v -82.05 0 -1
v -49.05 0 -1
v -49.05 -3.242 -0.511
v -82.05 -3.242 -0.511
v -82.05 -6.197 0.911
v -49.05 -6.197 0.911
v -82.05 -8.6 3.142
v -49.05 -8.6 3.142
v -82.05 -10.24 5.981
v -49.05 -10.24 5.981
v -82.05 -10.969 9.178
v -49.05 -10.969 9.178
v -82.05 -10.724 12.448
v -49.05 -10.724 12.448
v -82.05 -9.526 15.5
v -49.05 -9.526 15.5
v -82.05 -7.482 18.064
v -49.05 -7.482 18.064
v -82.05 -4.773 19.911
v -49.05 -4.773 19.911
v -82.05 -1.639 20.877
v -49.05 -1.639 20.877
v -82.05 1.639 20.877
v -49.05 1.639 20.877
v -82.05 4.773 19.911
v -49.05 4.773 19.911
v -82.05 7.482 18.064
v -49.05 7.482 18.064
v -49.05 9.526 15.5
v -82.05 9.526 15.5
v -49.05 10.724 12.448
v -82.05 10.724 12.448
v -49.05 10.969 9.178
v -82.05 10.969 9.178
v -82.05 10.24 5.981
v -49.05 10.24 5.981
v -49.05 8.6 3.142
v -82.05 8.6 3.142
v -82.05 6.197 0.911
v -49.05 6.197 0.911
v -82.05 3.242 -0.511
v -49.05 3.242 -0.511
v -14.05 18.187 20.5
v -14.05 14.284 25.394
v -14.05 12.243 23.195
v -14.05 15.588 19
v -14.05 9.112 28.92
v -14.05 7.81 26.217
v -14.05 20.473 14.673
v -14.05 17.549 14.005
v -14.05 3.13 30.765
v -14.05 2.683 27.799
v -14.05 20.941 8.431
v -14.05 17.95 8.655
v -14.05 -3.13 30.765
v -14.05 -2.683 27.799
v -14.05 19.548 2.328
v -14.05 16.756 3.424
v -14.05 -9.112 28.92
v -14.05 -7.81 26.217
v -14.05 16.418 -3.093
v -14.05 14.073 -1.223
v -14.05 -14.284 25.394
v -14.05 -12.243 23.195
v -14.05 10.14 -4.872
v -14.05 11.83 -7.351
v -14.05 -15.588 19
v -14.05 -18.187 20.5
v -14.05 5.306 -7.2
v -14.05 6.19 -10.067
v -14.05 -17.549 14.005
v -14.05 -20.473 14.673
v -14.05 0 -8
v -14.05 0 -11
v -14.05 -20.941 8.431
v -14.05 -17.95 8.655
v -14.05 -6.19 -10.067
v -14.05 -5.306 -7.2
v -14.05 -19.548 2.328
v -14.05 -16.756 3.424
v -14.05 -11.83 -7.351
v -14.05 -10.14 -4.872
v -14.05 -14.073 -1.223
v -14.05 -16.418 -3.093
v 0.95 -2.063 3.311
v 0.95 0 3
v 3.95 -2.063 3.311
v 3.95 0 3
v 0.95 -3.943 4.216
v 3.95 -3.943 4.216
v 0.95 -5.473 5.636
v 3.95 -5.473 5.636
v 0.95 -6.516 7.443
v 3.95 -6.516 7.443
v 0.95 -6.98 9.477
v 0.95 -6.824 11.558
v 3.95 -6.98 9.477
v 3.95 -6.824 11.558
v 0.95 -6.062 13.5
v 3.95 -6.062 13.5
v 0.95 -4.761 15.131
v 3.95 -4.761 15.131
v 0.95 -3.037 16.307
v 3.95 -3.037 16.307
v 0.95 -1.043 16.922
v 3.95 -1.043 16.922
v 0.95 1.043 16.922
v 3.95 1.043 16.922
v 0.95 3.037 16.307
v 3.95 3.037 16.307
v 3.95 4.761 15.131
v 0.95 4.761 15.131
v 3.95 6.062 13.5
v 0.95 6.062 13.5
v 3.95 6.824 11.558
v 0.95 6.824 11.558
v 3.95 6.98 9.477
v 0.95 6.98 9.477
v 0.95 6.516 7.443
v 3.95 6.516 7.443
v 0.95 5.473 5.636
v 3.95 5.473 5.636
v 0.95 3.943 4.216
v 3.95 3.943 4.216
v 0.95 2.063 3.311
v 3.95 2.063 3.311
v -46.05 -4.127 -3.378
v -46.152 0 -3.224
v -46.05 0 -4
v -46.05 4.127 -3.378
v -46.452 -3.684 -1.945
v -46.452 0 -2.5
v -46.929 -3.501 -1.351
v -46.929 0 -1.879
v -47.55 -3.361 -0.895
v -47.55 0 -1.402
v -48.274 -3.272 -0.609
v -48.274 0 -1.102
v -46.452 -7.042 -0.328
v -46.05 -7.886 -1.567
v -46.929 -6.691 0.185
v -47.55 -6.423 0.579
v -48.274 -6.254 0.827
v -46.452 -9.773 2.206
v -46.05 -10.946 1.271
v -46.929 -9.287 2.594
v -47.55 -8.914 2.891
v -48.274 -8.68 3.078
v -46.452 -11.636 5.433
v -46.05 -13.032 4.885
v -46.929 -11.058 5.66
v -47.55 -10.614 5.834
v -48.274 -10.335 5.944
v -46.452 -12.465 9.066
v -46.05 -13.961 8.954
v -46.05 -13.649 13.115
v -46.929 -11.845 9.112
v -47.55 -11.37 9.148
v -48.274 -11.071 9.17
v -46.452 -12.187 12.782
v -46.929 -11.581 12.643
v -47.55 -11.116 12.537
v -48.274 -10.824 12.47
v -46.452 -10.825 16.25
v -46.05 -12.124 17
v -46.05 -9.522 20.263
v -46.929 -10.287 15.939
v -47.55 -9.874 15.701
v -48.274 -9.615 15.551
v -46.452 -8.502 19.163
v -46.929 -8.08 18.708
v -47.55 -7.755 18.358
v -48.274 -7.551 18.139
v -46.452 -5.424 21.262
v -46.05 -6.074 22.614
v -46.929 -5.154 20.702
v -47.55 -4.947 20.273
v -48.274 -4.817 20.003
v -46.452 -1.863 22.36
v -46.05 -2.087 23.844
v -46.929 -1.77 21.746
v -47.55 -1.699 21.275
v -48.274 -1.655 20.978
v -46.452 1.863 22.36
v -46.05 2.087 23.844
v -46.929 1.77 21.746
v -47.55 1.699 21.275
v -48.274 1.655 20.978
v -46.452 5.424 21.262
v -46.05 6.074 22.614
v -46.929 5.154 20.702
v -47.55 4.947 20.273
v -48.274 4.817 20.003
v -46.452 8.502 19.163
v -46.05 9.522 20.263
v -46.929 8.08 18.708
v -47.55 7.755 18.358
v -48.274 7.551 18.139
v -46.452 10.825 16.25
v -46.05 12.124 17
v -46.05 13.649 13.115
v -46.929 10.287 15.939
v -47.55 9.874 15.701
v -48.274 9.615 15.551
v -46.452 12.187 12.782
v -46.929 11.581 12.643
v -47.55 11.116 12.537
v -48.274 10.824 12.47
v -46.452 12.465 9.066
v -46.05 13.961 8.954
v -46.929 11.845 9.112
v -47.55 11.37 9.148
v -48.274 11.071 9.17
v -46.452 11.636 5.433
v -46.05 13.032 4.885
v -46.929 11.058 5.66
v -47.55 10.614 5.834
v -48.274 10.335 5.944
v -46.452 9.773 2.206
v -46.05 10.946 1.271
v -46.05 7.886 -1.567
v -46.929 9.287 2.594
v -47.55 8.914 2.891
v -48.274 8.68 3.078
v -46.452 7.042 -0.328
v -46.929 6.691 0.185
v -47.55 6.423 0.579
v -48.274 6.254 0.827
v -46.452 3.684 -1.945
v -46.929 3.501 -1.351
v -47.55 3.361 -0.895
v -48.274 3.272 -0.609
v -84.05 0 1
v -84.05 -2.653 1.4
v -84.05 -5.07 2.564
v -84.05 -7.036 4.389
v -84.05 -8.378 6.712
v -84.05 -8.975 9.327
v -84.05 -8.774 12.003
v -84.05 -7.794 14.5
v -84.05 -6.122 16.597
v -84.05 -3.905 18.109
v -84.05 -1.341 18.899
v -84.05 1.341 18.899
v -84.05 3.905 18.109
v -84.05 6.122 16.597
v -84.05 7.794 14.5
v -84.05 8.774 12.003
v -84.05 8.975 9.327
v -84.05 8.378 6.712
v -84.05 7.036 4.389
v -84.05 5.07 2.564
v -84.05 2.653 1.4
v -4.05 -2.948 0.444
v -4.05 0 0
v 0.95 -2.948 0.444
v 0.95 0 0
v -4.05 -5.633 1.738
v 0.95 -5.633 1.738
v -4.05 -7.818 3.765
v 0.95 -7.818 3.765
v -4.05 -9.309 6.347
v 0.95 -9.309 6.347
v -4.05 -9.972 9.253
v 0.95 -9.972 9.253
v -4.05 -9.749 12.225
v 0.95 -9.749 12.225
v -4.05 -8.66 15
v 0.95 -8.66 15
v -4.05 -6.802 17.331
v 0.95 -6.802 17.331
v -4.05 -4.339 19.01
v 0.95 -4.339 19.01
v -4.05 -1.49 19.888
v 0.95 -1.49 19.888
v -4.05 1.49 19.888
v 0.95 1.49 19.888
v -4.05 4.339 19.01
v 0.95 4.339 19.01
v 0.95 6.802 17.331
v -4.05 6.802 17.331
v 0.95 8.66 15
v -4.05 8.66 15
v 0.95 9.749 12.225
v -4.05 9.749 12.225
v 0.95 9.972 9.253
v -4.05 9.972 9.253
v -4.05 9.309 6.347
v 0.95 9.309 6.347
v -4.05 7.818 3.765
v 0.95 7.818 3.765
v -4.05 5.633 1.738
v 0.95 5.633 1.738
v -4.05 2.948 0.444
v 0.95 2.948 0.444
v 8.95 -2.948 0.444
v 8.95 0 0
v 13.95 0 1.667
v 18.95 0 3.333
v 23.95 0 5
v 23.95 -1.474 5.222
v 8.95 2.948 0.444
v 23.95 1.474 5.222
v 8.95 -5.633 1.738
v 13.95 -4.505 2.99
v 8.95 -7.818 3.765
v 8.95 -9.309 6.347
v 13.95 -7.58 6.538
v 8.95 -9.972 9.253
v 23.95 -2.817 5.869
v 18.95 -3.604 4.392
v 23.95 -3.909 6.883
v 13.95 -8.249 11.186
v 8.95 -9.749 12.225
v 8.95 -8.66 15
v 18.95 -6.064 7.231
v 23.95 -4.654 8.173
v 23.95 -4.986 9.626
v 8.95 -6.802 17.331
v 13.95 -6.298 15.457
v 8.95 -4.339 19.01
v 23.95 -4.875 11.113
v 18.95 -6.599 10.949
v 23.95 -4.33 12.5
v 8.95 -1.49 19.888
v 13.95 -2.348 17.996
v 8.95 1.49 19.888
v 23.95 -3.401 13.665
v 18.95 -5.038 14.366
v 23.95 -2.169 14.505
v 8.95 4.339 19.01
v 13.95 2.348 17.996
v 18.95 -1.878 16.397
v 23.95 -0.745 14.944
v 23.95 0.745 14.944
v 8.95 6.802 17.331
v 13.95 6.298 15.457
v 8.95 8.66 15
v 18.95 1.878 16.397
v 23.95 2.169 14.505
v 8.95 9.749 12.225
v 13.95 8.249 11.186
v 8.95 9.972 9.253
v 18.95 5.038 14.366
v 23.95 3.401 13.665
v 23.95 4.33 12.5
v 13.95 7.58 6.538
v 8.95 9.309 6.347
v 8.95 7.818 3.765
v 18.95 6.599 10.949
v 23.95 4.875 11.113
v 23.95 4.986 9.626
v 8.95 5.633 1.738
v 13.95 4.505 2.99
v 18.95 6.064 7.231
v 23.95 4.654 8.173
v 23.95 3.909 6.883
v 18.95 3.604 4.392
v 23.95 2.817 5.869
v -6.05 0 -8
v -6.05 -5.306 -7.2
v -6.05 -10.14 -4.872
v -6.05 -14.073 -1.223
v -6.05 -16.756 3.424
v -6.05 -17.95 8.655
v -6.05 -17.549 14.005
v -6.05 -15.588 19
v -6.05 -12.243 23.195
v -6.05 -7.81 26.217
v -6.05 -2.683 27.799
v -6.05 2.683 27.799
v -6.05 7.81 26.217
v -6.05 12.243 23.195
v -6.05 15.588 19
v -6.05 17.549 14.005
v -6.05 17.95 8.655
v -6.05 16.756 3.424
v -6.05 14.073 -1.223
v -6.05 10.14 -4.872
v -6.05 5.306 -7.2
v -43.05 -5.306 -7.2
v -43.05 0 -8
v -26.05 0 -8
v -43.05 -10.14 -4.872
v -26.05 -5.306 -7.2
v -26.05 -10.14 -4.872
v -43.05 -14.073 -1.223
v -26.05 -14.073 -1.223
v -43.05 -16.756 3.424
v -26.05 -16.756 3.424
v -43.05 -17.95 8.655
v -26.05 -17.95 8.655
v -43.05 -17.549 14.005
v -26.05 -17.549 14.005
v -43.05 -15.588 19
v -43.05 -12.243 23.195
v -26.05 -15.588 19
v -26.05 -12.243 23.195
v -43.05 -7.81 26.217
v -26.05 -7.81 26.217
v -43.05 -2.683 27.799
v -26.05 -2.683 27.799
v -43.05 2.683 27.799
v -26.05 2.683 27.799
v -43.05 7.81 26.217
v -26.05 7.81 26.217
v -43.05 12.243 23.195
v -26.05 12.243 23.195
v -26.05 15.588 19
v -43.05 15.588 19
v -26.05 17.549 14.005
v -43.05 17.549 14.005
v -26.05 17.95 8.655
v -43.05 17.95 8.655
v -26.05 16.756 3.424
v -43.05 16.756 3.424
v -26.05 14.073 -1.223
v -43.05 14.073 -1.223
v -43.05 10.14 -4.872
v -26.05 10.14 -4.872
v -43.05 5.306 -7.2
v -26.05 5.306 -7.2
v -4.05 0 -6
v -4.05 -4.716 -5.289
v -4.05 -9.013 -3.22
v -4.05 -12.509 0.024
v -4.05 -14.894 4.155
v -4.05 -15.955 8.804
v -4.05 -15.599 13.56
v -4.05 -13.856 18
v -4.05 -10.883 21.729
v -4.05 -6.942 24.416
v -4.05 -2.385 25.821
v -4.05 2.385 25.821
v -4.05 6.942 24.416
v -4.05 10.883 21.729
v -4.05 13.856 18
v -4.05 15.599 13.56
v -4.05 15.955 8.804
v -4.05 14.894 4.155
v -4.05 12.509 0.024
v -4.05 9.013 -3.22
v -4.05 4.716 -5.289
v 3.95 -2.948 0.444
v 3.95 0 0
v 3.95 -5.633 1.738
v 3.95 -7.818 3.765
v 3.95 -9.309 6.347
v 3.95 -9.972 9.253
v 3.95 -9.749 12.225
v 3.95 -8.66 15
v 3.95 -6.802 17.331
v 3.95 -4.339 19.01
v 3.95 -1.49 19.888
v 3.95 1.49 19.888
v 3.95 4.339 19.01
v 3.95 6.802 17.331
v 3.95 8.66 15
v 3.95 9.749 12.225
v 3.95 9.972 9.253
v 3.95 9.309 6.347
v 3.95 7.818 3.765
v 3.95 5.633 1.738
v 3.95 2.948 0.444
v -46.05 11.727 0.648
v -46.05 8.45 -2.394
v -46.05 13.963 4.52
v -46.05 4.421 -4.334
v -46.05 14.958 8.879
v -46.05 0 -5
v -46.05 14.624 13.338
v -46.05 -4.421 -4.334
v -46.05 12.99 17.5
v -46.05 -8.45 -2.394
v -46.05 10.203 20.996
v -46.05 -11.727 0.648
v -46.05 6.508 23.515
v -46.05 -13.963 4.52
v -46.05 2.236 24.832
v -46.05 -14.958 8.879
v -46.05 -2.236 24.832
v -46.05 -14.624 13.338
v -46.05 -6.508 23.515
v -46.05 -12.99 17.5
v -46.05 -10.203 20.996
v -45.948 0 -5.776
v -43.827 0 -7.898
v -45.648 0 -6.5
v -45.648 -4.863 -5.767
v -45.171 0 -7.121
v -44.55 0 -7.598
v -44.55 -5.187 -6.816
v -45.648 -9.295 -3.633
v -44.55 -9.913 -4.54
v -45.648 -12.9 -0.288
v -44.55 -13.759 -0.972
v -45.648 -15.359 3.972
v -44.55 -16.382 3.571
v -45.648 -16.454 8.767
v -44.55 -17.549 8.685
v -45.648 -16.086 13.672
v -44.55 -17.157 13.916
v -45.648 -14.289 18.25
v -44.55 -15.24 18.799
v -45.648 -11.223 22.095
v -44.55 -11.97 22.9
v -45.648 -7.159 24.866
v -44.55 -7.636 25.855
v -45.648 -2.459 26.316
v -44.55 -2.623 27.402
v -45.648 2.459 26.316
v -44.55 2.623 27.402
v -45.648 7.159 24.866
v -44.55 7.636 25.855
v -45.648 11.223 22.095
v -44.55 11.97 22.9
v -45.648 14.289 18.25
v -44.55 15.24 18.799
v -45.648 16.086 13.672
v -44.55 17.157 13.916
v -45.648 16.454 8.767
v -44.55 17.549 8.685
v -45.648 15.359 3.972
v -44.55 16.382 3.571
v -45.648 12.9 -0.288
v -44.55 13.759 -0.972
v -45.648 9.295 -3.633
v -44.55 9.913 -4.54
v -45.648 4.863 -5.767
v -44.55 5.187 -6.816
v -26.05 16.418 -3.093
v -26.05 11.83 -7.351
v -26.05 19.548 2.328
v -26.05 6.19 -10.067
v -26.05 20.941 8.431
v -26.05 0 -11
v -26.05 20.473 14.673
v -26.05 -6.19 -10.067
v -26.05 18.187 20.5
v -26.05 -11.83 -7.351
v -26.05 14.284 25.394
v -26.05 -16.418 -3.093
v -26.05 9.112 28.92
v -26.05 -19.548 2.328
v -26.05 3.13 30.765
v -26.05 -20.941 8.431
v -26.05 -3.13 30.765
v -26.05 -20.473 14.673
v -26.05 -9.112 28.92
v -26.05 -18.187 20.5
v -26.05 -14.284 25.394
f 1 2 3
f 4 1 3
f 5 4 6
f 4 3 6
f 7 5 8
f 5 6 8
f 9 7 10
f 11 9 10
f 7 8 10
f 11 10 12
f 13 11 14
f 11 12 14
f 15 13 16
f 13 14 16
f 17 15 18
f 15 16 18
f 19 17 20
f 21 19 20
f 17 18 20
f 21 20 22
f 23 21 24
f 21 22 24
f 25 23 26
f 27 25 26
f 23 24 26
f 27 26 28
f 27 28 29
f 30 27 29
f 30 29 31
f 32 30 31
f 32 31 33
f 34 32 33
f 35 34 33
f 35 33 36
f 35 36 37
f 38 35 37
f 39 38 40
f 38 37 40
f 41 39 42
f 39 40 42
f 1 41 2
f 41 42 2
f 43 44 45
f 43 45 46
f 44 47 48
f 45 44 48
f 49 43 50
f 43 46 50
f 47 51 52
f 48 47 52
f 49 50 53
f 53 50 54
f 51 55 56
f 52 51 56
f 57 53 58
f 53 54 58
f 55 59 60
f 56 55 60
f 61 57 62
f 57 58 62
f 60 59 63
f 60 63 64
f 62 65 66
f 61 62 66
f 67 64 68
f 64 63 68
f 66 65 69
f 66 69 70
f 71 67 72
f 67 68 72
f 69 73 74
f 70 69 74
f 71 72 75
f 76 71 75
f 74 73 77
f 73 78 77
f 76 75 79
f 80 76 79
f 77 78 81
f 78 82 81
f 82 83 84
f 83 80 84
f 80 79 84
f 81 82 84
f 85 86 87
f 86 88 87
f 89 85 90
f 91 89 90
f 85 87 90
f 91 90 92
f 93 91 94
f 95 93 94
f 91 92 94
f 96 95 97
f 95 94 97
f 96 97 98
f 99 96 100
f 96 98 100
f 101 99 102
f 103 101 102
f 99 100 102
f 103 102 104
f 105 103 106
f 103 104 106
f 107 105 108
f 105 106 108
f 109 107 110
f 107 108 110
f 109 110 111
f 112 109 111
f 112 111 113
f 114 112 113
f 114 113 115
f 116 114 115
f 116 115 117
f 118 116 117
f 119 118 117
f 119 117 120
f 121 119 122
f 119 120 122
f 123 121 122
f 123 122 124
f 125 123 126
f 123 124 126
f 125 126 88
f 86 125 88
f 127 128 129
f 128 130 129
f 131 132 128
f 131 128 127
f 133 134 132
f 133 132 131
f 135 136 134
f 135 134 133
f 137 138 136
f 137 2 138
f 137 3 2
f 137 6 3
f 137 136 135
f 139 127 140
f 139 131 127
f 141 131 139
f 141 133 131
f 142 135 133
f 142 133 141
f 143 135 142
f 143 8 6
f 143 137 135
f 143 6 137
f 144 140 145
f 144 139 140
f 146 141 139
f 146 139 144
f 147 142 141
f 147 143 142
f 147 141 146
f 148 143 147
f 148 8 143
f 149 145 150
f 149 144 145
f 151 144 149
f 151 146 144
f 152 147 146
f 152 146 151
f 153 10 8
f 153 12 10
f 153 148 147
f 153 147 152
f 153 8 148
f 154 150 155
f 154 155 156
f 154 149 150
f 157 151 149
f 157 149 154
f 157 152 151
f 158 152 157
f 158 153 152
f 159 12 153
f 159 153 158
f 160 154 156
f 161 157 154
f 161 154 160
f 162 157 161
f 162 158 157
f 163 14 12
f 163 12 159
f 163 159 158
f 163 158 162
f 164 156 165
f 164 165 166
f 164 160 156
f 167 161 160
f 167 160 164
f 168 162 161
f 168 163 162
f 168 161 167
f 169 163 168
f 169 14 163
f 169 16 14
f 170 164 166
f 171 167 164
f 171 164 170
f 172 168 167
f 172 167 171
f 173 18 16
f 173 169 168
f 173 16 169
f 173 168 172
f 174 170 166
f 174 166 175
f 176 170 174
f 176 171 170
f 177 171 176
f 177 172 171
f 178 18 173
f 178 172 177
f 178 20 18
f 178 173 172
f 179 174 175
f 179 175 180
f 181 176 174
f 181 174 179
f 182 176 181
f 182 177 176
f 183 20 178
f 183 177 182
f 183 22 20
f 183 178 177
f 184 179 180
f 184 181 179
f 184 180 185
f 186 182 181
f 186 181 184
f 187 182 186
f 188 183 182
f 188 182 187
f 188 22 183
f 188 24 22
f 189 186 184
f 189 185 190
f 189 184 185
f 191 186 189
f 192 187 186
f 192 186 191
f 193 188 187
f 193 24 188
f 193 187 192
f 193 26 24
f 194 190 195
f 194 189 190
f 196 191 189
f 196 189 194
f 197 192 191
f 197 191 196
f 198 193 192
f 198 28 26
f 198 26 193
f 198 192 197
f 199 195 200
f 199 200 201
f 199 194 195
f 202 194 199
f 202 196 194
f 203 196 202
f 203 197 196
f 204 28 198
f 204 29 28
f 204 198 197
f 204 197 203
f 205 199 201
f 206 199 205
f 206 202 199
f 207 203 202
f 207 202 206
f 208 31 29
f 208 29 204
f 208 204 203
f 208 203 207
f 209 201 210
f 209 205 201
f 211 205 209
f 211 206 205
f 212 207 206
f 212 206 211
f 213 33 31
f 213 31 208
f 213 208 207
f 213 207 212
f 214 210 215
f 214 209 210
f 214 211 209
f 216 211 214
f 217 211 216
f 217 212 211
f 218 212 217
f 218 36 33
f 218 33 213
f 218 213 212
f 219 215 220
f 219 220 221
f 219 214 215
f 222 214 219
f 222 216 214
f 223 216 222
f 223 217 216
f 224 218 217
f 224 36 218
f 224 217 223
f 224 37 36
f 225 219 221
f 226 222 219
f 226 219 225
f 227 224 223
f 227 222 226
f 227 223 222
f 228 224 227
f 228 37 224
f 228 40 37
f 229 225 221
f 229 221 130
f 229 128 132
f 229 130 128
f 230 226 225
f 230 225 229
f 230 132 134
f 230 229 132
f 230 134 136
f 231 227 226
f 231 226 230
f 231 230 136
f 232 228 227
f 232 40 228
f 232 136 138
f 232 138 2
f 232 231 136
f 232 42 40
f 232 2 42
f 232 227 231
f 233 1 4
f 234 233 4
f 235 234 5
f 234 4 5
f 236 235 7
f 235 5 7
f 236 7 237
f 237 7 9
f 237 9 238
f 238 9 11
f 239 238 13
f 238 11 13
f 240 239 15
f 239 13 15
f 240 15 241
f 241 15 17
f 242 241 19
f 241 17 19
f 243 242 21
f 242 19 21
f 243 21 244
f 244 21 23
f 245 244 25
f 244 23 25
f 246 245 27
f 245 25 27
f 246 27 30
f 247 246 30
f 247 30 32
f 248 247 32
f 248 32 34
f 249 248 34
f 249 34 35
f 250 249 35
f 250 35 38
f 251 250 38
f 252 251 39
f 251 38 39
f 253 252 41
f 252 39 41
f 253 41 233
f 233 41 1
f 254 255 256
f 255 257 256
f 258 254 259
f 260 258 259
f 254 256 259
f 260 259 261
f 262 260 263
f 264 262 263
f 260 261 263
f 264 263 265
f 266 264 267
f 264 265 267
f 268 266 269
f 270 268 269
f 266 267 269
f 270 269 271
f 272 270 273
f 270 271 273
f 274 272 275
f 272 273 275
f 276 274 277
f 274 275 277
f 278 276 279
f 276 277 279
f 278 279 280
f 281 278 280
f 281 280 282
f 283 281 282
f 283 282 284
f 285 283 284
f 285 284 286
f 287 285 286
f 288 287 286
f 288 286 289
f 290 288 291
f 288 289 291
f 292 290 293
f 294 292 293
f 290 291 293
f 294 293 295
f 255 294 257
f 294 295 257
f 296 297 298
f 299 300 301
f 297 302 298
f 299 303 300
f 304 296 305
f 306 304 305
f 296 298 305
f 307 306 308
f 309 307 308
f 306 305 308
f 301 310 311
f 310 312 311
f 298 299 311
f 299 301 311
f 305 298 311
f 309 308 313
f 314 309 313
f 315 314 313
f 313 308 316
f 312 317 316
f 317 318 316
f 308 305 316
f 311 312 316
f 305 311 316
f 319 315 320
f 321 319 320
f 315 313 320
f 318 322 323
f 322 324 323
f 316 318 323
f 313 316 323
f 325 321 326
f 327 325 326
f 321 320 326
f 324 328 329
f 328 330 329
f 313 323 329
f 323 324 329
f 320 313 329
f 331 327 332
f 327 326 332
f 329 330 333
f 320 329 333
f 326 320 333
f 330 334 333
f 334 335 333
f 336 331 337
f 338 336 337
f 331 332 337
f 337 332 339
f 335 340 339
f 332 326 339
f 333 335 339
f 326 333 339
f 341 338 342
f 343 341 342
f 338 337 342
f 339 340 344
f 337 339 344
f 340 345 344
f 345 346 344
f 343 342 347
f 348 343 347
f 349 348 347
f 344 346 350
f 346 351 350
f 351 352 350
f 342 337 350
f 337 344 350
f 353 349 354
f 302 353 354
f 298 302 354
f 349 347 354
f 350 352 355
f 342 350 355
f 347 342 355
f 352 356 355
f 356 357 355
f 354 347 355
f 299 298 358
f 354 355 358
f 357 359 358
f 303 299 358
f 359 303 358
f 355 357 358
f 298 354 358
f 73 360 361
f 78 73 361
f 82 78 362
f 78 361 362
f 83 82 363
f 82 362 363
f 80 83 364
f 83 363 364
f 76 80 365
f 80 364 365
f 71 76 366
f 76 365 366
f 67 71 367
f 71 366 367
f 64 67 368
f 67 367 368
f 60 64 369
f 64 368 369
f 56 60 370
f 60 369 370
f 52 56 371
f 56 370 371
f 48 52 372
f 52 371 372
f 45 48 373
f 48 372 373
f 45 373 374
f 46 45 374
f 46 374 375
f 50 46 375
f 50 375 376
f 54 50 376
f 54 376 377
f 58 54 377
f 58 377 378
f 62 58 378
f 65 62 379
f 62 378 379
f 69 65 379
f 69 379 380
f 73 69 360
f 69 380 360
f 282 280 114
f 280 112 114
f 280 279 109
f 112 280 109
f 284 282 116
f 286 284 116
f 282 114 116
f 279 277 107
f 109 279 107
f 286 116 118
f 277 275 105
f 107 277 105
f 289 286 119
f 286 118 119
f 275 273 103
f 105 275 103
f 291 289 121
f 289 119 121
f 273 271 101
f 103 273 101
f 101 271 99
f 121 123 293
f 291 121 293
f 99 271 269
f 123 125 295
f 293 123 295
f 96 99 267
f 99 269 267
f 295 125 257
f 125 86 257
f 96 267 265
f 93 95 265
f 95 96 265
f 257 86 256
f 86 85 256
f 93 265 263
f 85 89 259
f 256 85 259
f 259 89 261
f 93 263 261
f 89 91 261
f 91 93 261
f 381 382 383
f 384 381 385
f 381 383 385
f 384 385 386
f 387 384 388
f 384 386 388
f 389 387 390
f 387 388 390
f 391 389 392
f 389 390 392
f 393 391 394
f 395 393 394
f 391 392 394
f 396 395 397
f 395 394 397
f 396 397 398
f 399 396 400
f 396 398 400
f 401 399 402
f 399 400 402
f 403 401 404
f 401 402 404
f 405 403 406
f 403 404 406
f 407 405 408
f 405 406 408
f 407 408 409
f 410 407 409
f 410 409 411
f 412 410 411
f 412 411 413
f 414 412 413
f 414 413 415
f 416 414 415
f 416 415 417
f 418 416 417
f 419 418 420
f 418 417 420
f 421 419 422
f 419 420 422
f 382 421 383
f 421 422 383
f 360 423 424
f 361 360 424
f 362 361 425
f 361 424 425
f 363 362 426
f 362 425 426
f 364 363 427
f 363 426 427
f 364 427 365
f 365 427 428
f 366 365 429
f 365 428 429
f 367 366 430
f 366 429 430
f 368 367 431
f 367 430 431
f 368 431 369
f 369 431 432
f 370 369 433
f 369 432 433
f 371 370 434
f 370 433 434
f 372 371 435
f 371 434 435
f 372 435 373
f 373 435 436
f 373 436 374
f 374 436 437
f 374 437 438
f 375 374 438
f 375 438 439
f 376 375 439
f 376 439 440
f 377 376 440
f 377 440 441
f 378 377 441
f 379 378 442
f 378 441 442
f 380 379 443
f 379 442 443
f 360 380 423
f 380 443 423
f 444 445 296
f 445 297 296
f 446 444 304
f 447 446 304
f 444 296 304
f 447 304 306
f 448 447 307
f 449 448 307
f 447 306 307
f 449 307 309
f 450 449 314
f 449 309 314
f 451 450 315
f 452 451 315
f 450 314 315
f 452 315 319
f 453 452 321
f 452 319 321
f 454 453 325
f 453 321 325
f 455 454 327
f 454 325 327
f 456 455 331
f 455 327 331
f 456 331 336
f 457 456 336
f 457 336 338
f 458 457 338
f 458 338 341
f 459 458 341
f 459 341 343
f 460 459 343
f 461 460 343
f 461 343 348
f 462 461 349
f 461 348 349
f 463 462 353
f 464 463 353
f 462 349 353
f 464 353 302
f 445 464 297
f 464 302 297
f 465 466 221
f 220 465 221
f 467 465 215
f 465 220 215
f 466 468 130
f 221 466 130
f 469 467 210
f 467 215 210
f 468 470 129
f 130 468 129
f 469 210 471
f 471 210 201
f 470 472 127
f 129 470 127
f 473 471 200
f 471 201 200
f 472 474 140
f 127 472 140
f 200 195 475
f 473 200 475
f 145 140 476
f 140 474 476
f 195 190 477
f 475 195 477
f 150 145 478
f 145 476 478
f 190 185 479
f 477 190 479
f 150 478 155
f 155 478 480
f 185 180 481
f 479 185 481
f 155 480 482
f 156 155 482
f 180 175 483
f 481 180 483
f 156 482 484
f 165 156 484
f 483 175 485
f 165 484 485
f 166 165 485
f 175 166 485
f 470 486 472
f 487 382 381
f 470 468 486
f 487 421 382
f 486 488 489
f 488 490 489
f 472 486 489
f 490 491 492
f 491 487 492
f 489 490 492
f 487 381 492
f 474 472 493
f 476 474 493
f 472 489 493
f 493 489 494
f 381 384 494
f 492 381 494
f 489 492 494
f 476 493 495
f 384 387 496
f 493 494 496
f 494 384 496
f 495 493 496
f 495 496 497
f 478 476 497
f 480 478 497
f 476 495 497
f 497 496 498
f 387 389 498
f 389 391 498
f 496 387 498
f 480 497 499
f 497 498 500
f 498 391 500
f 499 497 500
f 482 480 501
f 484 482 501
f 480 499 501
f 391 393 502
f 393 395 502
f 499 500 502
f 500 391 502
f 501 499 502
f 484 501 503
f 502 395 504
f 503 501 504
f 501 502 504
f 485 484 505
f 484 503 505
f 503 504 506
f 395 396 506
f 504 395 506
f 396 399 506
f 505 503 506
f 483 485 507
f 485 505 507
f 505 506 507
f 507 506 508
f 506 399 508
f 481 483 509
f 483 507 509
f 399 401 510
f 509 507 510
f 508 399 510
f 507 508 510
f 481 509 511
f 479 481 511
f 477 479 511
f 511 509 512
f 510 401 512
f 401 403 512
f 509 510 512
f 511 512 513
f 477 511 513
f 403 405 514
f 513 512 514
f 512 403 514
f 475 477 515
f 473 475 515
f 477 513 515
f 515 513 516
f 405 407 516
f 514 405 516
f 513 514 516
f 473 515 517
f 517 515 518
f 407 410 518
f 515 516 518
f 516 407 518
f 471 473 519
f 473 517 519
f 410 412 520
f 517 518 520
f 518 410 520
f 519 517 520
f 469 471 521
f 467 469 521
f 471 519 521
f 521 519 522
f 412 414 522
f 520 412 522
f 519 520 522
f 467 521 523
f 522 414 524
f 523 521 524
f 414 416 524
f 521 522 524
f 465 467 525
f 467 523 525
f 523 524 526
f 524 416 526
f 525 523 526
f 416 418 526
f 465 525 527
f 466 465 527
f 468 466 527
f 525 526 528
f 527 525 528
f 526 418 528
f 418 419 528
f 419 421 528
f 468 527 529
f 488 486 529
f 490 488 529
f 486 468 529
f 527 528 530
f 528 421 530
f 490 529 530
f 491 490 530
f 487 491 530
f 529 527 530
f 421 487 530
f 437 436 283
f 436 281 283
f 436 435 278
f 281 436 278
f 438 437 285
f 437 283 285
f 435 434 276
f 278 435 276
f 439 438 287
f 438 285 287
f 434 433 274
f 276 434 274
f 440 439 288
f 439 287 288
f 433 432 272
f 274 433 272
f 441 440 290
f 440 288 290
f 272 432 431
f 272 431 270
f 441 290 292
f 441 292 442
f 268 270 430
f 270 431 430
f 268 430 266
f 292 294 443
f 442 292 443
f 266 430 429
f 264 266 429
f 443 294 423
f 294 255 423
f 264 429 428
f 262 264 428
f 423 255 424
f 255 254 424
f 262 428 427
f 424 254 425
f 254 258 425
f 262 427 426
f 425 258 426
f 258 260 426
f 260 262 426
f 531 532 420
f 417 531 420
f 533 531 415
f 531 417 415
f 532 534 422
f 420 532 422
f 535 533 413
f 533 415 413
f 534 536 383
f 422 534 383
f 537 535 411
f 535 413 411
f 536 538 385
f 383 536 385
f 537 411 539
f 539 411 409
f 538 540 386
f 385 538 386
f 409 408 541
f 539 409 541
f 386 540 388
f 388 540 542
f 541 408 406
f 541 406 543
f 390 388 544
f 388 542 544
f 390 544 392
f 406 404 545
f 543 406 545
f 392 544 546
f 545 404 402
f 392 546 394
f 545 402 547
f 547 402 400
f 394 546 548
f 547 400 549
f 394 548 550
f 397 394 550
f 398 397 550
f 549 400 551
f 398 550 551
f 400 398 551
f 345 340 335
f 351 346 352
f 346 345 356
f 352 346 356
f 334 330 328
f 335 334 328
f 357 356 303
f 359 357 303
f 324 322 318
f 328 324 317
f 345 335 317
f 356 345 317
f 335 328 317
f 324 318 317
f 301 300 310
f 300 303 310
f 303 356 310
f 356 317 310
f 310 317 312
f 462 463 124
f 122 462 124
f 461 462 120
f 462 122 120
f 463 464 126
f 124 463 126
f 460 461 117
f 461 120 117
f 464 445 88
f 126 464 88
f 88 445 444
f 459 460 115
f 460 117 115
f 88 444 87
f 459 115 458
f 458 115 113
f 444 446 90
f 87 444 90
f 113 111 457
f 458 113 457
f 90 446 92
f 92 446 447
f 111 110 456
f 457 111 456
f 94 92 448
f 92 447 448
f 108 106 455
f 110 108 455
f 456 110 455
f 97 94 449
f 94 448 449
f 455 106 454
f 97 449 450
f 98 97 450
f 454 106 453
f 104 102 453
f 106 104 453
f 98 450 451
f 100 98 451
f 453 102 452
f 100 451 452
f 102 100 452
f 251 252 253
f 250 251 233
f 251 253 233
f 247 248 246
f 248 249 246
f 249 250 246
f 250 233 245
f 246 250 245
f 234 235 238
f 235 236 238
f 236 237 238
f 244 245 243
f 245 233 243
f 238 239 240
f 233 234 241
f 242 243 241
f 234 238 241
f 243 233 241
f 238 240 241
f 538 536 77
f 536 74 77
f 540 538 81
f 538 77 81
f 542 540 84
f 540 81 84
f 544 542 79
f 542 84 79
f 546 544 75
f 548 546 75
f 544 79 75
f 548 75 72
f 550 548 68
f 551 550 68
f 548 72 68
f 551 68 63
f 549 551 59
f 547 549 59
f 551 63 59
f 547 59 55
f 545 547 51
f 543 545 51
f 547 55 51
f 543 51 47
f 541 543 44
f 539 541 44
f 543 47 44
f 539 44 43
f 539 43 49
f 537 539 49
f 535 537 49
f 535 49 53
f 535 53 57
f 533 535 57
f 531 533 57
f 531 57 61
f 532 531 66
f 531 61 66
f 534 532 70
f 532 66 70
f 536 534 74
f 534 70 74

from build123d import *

# Parameters (mm, degrees)
F2_SIZE = 2
F3_R    = 3
F4_R    = 3


with BuildPart() as f1:
    # F0 (on Front) → F1 (revolve)
    with BuildSketch(Plane.XZ):
        Polygon((23.9498503727, 10), (-84.0501496273, 10), (-84.0501496273, -1), (-46.0501496273, -1), (-46.0501496273, -8), (-26.0501496273, -8), (-26.0501496273, -11), (-14.0501496273, -11), (-14.0501496273, -8), (-4.0501496273, -8), (-4.0501496273, 0), (0.9498503727, 0), (0.9498503727, 3), (3.9498503727, 3), (3.9498503727, 0), (8.9498503727, 0), (23.9498503727, 5), align=None)
    revolve(axis=Axis((-106.2277666089, 0, 10), (-1, 0, 0)))

    # F2
    f2_edges = [f1.edges().sort_by_distance(p)[0] for p in [
        (-84.05015, 0, 21),
        (-4.05015, 0, 28),
    ]]
    chamfer(f2_edges, length=F2_SIZE)

    # F3
    f3_edges = [f1.edges().sort_by_distance(p)[0] for p in [
        (-46.05015, 0, 28),
    ]]
    fillet(f3_edges, radius=F3_R)

    # F4
    f4_edges = [f1.edges().sort_by_distance(p)[0] for p in [
        (-46.05015, 0, 21),
    ]]
    fillet(f4_edges, radius=F4_R)


solid = f1.part
